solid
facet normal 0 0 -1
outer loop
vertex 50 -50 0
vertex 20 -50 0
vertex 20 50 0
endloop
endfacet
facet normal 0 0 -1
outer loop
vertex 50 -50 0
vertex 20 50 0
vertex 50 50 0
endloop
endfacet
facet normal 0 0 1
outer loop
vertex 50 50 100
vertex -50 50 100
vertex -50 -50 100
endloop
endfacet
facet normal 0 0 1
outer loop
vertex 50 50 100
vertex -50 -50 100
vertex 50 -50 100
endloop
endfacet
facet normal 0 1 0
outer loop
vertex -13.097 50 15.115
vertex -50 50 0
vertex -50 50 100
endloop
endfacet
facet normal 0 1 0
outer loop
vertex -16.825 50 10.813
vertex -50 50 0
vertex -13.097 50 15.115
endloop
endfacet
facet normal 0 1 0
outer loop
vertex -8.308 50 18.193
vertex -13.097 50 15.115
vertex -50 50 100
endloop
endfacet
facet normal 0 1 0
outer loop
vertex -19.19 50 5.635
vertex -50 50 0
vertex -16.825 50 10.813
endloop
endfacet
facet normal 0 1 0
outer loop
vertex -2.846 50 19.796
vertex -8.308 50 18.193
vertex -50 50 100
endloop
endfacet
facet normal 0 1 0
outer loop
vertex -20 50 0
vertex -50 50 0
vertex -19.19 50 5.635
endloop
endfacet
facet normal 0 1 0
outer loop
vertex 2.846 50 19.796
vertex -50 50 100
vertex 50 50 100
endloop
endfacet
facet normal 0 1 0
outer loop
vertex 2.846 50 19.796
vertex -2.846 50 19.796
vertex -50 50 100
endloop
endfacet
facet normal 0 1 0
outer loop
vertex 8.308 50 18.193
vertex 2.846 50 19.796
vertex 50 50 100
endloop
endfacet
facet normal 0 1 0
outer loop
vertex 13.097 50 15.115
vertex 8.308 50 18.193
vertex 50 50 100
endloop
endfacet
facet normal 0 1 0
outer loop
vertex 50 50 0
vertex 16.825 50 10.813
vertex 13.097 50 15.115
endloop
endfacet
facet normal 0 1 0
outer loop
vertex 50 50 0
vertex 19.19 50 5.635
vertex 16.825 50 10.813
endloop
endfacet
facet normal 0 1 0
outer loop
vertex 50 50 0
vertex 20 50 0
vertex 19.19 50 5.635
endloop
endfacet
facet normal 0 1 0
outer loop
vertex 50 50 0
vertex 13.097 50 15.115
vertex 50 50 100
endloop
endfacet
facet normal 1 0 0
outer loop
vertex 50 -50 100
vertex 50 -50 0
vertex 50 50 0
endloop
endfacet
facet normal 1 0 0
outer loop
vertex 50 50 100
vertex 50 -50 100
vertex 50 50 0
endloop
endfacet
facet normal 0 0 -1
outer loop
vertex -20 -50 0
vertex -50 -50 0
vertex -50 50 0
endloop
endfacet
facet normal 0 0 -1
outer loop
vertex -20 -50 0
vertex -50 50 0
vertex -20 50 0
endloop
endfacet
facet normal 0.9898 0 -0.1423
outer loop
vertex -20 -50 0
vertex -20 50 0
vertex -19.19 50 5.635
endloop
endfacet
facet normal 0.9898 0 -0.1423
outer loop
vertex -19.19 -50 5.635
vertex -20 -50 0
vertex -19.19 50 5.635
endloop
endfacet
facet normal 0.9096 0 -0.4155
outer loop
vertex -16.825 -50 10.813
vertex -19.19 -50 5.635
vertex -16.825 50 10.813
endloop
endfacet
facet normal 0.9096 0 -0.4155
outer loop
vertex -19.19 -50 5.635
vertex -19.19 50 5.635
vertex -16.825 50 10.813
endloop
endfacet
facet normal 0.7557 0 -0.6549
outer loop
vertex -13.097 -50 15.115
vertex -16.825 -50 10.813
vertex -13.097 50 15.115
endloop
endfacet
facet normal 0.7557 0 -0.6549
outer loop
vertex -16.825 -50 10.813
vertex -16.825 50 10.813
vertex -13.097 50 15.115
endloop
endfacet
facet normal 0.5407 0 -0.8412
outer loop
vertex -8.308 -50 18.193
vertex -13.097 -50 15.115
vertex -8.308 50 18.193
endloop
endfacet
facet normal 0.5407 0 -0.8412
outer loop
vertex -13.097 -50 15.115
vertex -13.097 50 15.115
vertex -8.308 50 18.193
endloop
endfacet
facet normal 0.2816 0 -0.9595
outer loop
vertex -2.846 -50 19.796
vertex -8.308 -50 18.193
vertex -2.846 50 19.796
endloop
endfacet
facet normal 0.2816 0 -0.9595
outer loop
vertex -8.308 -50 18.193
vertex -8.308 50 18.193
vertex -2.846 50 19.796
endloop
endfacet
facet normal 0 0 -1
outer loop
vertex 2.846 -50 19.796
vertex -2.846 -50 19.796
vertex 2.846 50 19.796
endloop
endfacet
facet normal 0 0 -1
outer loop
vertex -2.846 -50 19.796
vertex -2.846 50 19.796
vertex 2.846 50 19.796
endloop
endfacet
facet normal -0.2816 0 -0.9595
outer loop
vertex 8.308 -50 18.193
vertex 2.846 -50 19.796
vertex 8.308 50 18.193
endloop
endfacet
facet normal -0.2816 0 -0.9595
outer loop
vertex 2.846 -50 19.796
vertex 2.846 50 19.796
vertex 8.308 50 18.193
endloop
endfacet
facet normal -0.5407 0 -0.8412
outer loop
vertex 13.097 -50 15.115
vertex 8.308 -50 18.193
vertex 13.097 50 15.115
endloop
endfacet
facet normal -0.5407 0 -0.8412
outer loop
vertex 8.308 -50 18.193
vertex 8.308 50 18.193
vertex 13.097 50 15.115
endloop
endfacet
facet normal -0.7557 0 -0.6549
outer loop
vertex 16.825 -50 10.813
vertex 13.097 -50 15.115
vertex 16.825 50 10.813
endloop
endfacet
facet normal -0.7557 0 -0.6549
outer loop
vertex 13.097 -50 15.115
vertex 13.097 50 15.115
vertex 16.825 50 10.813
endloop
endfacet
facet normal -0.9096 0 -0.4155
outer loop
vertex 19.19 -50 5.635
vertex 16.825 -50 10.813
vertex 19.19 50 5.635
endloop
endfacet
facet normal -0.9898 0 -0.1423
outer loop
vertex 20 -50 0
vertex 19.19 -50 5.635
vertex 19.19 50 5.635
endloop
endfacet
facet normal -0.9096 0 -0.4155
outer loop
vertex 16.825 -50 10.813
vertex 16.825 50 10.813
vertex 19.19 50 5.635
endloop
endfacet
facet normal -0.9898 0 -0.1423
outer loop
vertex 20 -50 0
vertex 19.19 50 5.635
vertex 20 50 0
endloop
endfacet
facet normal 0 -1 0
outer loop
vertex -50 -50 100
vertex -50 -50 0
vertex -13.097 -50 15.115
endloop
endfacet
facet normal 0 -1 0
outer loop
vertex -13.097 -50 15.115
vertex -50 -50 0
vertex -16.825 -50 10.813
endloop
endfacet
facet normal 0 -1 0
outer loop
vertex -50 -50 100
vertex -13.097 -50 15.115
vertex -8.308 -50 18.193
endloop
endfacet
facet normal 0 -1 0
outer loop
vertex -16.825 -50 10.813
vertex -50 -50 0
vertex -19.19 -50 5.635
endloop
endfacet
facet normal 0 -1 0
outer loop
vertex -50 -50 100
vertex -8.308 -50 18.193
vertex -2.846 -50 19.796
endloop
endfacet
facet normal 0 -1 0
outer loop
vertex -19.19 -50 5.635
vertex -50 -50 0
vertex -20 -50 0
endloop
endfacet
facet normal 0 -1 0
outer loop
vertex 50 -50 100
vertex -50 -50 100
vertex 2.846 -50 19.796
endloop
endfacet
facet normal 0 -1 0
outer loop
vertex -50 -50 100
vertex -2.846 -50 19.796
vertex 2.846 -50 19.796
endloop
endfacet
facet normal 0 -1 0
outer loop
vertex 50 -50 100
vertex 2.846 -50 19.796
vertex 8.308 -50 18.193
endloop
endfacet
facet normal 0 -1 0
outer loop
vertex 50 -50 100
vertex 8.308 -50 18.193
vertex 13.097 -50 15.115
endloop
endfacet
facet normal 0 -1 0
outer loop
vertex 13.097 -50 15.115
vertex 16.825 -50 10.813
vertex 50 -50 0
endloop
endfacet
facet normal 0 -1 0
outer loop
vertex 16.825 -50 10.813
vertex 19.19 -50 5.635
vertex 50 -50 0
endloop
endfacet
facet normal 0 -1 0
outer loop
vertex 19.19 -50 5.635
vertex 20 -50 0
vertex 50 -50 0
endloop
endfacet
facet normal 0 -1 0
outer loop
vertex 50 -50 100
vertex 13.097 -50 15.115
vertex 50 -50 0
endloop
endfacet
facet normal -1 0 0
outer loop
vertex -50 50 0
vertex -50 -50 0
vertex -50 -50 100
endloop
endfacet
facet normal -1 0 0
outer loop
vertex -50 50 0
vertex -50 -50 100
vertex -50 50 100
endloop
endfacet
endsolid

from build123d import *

# Parameters (mm, degrees)
SKETCH_1_W          = 100
SKETCH_1_H          = 100
EXTRUDE_1_DEPTH     = 100
SKETCH_2_R          = 20
CUT_EXTRUDE_1_DEPTH = 151


with BuildPart() as part:
    # 草图1 → 凸台-拉伸1 (new body)
    with BuildSketch(Plane.XY):
        Rectangle(SKETCH_1_W, SKETCH_1_H)
    extrude(amount=EXTRUDE_1_DEPTH)

    # 草图2 → 切除-拉伸1 (cut, through all)
    with BuildSketch(Plane(origin=(0, 50, 0), x_dir=(1, 0, 0), z_dir=(0, 1, 0))):
        Circle(SKETCH_2_R)
    extrude(amount=-CUT_EXTRUDE_1_DEPTH, mode=Mode.SUBTRACT)


solid = part.part
